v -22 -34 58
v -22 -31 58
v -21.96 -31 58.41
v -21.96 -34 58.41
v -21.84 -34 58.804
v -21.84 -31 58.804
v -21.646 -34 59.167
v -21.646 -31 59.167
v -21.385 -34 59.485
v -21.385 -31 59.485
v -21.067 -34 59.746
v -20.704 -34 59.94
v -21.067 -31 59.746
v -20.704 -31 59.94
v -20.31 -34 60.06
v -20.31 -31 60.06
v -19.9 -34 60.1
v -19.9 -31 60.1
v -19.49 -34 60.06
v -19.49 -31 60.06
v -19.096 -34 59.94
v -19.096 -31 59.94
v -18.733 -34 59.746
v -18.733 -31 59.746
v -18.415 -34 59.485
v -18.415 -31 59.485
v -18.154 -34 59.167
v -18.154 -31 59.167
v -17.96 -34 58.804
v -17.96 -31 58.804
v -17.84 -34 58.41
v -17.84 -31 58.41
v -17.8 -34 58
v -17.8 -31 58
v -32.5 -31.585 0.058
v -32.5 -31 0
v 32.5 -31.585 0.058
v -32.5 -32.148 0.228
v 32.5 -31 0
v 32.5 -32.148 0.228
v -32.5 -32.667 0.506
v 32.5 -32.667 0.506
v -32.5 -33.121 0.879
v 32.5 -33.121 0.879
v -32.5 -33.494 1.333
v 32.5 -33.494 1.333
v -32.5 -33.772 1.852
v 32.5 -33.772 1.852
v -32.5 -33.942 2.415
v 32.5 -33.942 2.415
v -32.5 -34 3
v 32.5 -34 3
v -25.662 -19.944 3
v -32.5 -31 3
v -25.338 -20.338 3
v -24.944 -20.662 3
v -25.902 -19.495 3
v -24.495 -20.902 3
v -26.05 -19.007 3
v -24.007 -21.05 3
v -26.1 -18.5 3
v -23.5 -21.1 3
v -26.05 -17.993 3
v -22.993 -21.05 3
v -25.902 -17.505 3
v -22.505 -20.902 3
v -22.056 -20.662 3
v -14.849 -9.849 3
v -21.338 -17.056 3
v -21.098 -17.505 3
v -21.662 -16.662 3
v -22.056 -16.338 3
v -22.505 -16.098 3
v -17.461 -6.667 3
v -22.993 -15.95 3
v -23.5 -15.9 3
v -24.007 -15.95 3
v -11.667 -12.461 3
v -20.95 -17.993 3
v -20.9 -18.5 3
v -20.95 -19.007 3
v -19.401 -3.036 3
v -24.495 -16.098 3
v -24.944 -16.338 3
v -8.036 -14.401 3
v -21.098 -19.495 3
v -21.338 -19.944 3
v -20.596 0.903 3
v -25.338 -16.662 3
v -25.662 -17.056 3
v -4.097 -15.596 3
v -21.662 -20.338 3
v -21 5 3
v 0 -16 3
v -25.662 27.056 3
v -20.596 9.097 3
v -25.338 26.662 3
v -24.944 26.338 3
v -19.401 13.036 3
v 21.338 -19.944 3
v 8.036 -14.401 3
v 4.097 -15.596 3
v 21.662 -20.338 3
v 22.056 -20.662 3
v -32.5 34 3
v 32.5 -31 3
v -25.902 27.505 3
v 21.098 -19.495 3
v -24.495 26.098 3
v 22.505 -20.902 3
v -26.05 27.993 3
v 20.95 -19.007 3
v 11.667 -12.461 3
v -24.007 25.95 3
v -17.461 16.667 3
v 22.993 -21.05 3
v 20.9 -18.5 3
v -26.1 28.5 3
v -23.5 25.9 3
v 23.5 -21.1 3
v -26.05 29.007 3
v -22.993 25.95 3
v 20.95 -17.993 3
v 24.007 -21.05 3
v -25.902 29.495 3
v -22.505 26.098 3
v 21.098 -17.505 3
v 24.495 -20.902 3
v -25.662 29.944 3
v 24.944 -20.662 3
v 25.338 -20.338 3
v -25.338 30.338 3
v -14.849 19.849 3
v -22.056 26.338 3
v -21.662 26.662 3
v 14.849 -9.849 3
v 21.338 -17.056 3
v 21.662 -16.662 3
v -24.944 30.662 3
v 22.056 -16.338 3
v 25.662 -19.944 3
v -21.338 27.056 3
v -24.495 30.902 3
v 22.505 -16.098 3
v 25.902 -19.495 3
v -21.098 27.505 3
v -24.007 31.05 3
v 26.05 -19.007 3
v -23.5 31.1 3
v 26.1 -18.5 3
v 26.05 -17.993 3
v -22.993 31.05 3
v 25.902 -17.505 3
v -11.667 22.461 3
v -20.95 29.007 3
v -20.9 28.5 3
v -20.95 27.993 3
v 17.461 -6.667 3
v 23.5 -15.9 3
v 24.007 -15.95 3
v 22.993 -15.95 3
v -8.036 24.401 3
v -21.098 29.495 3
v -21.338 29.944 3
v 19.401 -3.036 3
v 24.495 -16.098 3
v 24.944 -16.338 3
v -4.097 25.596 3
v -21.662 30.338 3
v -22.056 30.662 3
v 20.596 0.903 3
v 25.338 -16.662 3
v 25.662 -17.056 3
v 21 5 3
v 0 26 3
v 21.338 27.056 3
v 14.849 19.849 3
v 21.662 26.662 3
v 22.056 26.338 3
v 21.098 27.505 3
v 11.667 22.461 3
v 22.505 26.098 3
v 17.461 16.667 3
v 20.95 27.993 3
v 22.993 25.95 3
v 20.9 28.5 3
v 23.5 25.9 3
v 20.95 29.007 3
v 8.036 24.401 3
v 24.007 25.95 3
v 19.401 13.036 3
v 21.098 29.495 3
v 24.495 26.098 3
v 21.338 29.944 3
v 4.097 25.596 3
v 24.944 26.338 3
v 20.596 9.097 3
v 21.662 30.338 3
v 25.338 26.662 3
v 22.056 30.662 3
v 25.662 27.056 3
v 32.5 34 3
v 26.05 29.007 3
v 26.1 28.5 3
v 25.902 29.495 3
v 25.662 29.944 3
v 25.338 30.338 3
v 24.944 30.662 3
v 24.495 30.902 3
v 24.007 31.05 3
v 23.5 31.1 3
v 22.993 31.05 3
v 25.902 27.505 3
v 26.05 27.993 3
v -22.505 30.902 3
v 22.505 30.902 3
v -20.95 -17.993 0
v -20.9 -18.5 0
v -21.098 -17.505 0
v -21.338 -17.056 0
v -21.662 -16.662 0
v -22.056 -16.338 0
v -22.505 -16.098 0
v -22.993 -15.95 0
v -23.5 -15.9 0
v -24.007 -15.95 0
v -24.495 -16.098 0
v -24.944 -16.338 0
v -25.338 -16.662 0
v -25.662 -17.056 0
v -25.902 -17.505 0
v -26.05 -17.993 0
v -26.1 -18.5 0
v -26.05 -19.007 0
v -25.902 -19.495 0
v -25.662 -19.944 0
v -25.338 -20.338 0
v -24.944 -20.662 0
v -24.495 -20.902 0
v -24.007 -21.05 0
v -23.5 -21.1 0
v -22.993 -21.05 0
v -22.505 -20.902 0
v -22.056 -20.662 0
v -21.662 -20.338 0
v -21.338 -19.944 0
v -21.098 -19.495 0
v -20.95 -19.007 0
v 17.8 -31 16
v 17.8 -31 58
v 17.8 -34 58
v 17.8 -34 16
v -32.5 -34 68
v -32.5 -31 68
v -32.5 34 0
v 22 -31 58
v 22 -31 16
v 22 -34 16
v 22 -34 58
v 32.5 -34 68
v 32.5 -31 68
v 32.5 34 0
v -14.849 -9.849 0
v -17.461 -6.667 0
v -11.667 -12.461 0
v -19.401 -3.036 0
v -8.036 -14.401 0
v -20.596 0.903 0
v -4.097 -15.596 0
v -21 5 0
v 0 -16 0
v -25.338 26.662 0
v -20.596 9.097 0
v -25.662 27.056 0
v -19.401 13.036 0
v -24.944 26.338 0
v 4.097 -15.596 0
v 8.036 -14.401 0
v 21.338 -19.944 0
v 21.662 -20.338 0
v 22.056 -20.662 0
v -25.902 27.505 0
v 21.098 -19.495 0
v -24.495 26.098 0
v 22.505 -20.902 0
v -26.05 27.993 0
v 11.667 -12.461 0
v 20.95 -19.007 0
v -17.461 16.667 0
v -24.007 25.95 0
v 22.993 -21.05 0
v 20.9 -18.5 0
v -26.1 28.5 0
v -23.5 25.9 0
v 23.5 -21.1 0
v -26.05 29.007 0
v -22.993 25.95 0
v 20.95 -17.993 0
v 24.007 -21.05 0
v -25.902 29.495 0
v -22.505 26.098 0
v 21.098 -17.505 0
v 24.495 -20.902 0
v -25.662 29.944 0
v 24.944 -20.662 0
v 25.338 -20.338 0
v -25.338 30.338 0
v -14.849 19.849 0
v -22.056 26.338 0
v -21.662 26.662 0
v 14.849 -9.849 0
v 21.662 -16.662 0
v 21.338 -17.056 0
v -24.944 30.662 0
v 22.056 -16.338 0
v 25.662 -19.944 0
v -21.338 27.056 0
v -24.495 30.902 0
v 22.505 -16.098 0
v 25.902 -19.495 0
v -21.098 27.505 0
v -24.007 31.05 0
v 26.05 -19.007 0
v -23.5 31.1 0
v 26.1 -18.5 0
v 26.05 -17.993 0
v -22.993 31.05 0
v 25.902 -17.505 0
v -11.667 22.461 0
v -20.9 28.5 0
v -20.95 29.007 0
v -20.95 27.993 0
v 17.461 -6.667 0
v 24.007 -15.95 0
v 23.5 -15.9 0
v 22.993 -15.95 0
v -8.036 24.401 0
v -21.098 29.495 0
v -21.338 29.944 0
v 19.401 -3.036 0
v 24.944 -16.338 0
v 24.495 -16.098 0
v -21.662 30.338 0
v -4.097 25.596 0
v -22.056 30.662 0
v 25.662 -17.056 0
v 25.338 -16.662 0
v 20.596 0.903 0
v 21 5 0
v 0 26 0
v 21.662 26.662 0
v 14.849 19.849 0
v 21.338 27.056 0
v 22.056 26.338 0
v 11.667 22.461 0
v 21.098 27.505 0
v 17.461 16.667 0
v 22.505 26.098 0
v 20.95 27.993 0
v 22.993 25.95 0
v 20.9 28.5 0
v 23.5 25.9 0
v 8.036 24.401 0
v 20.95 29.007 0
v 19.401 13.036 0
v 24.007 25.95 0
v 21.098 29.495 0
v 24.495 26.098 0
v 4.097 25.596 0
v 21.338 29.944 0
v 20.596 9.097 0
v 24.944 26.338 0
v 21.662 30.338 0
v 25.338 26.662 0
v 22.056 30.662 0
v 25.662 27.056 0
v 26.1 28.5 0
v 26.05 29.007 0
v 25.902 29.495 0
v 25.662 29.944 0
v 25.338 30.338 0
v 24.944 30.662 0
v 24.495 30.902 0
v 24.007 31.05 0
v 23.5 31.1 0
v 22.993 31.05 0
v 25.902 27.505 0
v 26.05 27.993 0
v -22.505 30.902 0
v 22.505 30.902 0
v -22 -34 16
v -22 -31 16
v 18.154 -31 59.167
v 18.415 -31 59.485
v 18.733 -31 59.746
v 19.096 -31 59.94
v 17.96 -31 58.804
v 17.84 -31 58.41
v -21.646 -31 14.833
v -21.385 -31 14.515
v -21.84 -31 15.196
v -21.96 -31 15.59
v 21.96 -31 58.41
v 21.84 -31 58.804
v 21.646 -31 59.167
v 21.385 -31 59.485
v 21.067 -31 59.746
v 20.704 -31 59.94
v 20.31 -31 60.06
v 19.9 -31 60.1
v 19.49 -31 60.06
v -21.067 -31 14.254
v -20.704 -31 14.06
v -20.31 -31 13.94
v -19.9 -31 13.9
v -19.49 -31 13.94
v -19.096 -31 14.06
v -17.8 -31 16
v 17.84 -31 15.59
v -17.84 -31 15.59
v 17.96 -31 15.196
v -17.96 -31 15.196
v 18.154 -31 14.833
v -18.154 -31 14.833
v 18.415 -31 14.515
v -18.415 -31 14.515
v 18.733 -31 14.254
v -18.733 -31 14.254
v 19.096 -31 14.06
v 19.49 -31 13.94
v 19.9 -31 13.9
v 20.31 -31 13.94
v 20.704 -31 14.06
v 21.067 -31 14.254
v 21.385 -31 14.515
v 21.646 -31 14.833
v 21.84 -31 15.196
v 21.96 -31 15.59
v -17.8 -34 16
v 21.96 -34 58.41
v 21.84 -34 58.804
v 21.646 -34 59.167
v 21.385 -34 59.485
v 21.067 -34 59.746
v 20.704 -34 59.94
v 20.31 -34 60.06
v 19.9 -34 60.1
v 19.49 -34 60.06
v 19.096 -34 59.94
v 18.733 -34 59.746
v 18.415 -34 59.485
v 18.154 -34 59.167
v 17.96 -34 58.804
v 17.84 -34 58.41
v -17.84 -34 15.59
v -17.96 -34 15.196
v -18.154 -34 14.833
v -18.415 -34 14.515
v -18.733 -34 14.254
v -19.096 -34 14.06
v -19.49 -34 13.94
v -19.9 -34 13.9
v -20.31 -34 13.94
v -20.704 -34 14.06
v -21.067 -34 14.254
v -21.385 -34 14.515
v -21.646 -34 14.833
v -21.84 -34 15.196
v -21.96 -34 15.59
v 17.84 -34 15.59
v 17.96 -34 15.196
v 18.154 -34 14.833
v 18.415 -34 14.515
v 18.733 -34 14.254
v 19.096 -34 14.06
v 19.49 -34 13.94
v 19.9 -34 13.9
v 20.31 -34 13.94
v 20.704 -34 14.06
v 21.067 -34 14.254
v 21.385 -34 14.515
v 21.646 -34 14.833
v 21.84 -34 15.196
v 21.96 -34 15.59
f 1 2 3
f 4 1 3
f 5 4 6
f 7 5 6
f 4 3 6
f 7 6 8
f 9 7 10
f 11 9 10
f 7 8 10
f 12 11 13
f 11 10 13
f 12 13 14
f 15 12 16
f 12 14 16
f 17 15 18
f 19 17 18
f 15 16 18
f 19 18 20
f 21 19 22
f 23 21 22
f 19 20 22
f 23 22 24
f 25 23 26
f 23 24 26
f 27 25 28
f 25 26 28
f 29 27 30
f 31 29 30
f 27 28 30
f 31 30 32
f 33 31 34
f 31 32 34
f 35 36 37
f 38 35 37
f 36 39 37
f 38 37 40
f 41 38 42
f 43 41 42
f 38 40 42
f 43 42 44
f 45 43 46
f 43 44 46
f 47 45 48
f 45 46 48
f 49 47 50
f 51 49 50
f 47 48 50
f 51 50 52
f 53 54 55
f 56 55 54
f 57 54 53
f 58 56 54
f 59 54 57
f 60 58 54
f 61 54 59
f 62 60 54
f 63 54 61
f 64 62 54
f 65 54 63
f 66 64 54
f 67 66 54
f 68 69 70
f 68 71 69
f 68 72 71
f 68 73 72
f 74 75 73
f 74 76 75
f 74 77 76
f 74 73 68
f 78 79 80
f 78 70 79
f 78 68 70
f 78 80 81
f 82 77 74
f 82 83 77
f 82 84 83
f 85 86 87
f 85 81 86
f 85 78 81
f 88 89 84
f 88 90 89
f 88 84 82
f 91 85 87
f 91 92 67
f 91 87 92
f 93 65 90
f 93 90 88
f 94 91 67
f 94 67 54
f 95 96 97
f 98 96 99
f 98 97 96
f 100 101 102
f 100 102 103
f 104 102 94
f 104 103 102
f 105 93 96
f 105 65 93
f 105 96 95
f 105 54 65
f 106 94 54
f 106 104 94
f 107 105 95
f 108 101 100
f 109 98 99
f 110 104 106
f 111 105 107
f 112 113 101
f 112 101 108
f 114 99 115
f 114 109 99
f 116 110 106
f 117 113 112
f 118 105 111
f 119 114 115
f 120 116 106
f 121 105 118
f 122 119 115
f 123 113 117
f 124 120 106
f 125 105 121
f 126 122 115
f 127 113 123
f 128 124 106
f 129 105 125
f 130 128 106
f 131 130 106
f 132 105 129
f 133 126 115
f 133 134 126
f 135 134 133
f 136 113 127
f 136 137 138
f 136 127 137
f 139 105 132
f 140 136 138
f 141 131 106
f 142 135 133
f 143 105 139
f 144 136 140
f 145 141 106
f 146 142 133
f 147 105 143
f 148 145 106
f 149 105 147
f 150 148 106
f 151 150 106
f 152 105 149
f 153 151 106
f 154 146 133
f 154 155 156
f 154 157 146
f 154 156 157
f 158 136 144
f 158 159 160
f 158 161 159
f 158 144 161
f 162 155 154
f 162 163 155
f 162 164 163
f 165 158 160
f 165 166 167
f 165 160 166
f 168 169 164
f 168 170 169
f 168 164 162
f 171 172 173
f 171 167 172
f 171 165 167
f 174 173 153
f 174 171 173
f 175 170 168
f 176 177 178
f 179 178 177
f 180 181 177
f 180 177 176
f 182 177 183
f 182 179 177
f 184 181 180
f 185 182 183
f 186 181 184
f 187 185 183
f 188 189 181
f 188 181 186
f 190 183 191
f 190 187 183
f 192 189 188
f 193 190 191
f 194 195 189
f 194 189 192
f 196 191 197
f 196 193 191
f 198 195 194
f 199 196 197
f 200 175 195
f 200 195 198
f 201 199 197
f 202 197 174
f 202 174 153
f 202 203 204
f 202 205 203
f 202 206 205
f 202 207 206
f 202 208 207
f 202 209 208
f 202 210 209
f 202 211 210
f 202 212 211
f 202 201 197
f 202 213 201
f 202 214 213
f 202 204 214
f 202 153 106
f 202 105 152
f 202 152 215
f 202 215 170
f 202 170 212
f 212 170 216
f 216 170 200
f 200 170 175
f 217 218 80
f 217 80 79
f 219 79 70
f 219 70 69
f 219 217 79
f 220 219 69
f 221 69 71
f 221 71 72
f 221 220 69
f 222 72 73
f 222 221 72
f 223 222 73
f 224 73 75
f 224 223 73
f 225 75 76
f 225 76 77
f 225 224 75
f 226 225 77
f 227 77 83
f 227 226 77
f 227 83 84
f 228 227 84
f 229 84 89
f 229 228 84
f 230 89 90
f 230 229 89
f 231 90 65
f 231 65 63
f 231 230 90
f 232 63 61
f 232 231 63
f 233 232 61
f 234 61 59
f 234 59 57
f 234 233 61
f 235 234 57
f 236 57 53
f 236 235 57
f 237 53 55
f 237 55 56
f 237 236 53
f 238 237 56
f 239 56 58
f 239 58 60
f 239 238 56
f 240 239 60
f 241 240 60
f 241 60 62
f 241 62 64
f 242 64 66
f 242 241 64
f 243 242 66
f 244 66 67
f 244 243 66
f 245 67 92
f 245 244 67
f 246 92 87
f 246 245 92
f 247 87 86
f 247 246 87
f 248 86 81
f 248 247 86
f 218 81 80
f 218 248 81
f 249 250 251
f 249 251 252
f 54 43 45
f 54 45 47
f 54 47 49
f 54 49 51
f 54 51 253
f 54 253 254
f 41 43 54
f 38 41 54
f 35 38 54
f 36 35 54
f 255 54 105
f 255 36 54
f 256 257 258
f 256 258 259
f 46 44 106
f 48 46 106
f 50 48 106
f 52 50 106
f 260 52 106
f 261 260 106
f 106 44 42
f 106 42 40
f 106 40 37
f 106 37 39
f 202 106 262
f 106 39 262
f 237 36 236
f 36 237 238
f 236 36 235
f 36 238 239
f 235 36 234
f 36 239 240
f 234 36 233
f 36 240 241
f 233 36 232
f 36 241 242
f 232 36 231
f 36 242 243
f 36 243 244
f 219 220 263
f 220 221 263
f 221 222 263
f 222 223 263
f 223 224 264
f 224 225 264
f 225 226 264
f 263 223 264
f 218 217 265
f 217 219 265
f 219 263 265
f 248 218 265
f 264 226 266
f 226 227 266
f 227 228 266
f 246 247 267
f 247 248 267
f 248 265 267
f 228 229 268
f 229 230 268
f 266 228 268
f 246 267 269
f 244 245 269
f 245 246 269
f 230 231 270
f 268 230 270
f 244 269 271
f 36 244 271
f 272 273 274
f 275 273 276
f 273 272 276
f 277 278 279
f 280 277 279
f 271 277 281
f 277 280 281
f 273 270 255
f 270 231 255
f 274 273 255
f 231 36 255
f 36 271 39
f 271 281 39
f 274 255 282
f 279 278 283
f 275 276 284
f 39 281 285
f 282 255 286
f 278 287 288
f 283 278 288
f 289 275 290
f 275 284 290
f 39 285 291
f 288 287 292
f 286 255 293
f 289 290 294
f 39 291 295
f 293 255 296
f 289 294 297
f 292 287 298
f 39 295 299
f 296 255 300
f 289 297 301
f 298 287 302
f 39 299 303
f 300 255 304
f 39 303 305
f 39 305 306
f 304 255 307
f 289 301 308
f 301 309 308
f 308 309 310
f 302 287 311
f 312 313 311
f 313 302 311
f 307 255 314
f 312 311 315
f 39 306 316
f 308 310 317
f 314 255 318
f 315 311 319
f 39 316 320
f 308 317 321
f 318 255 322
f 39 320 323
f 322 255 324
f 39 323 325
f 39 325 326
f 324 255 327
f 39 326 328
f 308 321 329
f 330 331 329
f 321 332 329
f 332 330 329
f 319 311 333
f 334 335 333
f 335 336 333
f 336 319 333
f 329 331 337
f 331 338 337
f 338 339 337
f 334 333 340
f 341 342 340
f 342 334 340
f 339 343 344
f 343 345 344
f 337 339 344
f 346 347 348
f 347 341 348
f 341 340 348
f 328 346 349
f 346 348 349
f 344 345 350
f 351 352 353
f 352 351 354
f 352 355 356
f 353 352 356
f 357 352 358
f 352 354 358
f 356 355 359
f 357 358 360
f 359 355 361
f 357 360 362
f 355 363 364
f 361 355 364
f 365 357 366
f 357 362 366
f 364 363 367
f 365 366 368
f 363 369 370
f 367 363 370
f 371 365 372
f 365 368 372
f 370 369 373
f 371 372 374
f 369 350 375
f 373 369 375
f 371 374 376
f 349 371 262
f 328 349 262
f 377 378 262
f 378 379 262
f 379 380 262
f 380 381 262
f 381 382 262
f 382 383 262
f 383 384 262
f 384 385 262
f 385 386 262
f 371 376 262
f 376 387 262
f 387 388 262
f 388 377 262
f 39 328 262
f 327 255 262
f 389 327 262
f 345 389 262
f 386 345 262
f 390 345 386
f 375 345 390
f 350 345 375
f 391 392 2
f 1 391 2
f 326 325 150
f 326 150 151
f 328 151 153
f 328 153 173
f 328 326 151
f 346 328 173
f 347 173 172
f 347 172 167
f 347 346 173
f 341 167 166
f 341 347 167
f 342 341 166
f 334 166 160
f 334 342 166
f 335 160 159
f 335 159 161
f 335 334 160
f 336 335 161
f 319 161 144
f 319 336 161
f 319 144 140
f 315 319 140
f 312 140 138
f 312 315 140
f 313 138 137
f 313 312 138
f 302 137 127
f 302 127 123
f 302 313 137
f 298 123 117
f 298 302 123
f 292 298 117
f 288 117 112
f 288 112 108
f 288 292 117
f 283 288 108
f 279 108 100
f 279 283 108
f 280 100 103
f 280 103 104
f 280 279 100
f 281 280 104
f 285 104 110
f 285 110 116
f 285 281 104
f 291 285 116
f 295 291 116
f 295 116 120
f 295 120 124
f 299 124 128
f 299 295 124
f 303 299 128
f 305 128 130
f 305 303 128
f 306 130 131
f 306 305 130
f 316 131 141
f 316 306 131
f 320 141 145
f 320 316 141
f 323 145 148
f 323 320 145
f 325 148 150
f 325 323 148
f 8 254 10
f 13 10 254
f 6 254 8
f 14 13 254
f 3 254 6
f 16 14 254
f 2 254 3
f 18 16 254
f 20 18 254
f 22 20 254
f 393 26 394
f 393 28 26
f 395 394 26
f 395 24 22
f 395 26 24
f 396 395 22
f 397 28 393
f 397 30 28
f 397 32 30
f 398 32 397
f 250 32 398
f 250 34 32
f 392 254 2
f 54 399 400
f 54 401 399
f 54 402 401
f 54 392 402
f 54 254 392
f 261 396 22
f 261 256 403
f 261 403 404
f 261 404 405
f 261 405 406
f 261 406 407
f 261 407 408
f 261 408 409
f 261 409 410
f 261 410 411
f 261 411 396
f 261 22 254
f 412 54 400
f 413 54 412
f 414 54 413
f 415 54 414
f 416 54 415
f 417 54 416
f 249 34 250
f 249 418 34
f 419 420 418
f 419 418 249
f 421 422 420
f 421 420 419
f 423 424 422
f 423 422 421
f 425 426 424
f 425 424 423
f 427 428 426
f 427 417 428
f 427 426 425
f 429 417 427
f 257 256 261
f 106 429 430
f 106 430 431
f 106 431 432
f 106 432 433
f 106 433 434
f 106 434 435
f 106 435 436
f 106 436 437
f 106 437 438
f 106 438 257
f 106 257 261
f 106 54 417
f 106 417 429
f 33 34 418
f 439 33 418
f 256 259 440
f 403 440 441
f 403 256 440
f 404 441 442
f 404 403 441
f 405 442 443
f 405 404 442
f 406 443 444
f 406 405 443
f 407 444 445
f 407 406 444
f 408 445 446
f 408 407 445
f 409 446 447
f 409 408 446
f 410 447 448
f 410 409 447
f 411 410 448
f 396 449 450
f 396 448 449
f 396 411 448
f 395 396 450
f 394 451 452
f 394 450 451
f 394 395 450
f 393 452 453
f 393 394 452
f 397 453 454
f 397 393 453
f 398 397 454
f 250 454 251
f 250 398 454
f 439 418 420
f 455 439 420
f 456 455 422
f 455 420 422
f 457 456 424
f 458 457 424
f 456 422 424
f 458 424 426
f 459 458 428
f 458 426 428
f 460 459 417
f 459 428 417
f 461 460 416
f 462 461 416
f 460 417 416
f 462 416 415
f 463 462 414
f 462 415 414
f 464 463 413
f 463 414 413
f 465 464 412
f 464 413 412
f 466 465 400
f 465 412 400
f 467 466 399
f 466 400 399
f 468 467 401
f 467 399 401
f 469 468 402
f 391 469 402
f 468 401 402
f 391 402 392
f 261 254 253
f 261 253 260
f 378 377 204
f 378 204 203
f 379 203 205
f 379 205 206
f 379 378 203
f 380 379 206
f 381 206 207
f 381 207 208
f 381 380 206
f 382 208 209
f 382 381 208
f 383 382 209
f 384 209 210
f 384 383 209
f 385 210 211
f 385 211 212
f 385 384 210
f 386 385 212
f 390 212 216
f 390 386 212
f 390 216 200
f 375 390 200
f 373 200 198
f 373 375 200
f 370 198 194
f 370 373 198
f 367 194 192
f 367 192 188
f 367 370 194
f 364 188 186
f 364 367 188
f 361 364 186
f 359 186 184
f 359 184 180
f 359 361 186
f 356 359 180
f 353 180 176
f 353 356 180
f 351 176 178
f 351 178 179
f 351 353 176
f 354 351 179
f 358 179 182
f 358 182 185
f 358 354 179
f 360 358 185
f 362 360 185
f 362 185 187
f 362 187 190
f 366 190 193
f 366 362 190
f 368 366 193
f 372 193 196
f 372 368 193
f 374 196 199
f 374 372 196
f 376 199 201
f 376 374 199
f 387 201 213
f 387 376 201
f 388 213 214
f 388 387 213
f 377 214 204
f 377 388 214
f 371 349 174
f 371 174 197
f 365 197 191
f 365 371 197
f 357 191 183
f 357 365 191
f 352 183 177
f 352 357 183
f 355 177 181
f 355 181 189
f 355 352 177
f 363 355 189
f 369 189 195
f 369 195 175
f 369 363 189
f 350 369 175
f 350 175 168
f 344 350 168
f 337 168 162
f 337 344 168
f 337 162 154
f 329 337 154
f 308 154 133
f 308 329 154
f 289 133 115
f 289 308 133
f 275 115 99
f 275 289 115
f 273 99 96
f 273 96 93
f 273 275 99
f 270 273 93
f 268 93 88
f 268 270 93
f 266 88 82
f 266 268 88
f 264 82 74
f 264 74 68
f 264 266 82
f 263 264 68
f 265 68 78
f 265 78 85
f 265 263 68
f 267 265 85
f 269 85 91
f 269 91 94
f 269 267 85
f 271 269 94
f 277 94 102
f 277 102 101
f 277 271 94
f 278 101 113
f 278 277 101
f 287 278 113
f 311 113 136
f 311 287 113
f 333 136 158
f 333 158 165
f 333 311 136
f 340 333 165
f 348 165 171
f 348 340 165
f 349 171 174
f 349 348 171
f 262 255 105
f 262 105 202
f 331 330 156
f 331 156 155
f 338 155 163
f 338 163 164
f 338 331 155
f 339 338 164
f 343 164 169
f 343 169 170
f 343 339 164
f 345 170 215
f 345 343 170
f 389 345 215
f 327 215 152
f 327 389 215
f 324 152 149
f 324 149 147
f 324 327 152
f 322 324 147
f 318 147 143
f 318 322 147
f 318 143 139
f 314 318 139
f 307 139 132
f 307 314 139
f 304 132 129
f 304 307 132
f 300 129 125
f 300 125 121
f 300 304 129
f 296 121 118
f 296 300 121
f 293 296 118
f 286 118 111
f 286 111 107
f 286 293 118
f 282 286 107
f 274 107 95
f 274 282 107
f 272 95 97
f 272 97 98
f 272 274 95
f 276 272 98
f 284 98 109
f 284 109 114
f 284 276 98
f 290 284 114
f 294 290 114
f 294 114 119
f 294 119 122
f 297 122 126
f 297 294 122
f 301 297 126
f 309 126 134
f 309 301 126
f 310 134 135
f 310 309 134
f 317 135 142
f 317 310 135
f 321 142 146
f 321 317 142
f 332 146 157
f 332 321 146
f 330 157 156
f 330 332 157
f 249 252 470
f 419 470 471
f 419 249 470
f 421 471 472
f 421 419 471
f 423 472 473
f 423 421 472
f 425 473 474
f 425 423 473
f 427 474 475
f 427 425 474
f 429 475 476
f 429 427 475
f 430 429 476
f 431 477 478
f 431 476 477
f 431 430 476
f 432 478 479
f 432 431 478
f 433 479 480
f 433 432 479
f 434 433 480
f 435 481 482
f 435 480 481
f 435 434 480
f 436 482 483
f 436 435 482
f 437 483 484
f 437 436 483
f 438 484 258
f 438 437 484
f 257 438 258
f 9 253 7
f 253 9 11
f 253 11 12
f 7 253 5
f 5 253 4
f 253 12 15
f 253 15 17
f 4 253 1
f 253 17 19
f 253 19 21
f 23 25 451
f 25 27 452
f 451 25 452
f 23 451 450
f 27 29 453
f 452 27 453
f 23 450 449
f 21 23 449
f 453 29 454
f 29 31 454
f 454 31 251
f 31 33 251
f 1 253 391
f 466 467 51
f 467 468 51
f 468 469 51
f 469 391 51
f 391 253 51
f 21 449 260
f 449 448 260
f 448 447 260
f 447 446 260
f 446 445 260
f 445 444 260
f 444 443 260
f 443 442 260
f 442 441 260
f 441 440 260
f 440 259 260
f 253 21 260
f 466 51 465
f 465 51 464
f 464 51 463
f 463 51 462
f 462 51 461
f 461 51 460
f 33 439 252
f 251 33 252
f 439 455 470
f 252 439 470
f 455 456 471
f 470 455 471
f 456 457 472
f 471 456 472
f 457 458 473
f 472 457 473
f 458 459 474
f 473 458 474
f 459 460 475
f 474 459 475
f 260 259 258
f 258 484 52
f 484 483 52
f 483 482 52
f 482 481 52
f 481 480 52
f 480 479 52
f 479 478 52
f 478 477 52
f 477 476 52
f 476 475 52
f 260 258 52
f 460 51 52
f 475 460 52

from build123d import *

# Parameters (mm, degrees)
SKETCH_1_W          = 65
SKETCH_1_H          = 68
SKETCH_1_R          = 21
SKETCH_1_R_2        = 2.6
EXTRUDE_1_DEPTH     = 3
SKETCH_2_W          = 65
SKETCH_2_H          = 3
EXTRUDE_2_DEPTH     = 65
CUT_EXTRUDE_1_DEPTH = 65
FILLET_1_R          = 3


with BuildPart() as part:
    # 草图1 → 凸台-拉伸1 (new body)
    with BuildSketch(Plane.XY):
        Rectangle(SKETCH_1_W, SKETCH_1_H)
        with Locations((0, 5)):
            Circle(SKETCH_1_R, mode=Mode.SUBTRACT)
        with Locations((23.5, 28.5)):
            Circle(SKETCH_1_R_2, mode=Mode.SUBTRACT)
        with Locations((-23.5, 28.5)):
            Circle(SKETCH_1_R_2, mode=Mode.SUBTRACT)
        with Locations((-23.5, -18.5)):
            Circle(SKETCH_1_R_2, mode=Mode.SUBTRACT)
        with Locations((23.5, -18.5)):
            Circle(SKETCH_1_R_2, mode=Mode.SUBTRACT)
    extrude(amount=EXTRUDE_1_DEPTH)

    # 草图2 → 凸台-拉伸2 (add)
    with BuildSketch(Plane.XY.offset(3)):
        with Locations((0, -32.5)):
            Rectangle(SKETCH_2_W, SKETCH_2_H)
    extrude(amount=EXTRUDE_2_DEPTH)

    # 草图3 → 切除-拉伸1 (cut)
    with BuildSketch(Plane(origin=(0, -31, 0), x_dir=(1, 0, 0), z_dir=(0, 1, 0))):
        with BuildLine():
            Line((22, -16), (22, -58))
            ThreePointArc((22, -58), (19.9, -60.1), (17.8, -58))
            Line((17.8, -58), (17.8, -16))
            ThreePointArc((17.8, -16), (19.9, -13.9), (22, -16))
        make_face()
        with BuildLine():
            Line((-22, -16), (-22, -58))
            ThreePointArc((-22, -58), (-19.9, -60.1), (-17.8, -58))
            Line((-17.8, -58), (-17.8, -16))
            ThreePointArc((-17.8, -16), (-19.9, -13.9), (-22, -16))
        make_face()
    extrude(amount=-CUT_EXTRUDE_1_DEPTH, mode=Mode.SUBTRACT)

    # 圆角1
    fillet_1_edges = [part.edges().sort_by_distance(p)[0] for p in [
        (0, -34, 0),
    ]]
    fillet(fillet_1_edges, radius=FILLET_1_R)


solid = part.part
